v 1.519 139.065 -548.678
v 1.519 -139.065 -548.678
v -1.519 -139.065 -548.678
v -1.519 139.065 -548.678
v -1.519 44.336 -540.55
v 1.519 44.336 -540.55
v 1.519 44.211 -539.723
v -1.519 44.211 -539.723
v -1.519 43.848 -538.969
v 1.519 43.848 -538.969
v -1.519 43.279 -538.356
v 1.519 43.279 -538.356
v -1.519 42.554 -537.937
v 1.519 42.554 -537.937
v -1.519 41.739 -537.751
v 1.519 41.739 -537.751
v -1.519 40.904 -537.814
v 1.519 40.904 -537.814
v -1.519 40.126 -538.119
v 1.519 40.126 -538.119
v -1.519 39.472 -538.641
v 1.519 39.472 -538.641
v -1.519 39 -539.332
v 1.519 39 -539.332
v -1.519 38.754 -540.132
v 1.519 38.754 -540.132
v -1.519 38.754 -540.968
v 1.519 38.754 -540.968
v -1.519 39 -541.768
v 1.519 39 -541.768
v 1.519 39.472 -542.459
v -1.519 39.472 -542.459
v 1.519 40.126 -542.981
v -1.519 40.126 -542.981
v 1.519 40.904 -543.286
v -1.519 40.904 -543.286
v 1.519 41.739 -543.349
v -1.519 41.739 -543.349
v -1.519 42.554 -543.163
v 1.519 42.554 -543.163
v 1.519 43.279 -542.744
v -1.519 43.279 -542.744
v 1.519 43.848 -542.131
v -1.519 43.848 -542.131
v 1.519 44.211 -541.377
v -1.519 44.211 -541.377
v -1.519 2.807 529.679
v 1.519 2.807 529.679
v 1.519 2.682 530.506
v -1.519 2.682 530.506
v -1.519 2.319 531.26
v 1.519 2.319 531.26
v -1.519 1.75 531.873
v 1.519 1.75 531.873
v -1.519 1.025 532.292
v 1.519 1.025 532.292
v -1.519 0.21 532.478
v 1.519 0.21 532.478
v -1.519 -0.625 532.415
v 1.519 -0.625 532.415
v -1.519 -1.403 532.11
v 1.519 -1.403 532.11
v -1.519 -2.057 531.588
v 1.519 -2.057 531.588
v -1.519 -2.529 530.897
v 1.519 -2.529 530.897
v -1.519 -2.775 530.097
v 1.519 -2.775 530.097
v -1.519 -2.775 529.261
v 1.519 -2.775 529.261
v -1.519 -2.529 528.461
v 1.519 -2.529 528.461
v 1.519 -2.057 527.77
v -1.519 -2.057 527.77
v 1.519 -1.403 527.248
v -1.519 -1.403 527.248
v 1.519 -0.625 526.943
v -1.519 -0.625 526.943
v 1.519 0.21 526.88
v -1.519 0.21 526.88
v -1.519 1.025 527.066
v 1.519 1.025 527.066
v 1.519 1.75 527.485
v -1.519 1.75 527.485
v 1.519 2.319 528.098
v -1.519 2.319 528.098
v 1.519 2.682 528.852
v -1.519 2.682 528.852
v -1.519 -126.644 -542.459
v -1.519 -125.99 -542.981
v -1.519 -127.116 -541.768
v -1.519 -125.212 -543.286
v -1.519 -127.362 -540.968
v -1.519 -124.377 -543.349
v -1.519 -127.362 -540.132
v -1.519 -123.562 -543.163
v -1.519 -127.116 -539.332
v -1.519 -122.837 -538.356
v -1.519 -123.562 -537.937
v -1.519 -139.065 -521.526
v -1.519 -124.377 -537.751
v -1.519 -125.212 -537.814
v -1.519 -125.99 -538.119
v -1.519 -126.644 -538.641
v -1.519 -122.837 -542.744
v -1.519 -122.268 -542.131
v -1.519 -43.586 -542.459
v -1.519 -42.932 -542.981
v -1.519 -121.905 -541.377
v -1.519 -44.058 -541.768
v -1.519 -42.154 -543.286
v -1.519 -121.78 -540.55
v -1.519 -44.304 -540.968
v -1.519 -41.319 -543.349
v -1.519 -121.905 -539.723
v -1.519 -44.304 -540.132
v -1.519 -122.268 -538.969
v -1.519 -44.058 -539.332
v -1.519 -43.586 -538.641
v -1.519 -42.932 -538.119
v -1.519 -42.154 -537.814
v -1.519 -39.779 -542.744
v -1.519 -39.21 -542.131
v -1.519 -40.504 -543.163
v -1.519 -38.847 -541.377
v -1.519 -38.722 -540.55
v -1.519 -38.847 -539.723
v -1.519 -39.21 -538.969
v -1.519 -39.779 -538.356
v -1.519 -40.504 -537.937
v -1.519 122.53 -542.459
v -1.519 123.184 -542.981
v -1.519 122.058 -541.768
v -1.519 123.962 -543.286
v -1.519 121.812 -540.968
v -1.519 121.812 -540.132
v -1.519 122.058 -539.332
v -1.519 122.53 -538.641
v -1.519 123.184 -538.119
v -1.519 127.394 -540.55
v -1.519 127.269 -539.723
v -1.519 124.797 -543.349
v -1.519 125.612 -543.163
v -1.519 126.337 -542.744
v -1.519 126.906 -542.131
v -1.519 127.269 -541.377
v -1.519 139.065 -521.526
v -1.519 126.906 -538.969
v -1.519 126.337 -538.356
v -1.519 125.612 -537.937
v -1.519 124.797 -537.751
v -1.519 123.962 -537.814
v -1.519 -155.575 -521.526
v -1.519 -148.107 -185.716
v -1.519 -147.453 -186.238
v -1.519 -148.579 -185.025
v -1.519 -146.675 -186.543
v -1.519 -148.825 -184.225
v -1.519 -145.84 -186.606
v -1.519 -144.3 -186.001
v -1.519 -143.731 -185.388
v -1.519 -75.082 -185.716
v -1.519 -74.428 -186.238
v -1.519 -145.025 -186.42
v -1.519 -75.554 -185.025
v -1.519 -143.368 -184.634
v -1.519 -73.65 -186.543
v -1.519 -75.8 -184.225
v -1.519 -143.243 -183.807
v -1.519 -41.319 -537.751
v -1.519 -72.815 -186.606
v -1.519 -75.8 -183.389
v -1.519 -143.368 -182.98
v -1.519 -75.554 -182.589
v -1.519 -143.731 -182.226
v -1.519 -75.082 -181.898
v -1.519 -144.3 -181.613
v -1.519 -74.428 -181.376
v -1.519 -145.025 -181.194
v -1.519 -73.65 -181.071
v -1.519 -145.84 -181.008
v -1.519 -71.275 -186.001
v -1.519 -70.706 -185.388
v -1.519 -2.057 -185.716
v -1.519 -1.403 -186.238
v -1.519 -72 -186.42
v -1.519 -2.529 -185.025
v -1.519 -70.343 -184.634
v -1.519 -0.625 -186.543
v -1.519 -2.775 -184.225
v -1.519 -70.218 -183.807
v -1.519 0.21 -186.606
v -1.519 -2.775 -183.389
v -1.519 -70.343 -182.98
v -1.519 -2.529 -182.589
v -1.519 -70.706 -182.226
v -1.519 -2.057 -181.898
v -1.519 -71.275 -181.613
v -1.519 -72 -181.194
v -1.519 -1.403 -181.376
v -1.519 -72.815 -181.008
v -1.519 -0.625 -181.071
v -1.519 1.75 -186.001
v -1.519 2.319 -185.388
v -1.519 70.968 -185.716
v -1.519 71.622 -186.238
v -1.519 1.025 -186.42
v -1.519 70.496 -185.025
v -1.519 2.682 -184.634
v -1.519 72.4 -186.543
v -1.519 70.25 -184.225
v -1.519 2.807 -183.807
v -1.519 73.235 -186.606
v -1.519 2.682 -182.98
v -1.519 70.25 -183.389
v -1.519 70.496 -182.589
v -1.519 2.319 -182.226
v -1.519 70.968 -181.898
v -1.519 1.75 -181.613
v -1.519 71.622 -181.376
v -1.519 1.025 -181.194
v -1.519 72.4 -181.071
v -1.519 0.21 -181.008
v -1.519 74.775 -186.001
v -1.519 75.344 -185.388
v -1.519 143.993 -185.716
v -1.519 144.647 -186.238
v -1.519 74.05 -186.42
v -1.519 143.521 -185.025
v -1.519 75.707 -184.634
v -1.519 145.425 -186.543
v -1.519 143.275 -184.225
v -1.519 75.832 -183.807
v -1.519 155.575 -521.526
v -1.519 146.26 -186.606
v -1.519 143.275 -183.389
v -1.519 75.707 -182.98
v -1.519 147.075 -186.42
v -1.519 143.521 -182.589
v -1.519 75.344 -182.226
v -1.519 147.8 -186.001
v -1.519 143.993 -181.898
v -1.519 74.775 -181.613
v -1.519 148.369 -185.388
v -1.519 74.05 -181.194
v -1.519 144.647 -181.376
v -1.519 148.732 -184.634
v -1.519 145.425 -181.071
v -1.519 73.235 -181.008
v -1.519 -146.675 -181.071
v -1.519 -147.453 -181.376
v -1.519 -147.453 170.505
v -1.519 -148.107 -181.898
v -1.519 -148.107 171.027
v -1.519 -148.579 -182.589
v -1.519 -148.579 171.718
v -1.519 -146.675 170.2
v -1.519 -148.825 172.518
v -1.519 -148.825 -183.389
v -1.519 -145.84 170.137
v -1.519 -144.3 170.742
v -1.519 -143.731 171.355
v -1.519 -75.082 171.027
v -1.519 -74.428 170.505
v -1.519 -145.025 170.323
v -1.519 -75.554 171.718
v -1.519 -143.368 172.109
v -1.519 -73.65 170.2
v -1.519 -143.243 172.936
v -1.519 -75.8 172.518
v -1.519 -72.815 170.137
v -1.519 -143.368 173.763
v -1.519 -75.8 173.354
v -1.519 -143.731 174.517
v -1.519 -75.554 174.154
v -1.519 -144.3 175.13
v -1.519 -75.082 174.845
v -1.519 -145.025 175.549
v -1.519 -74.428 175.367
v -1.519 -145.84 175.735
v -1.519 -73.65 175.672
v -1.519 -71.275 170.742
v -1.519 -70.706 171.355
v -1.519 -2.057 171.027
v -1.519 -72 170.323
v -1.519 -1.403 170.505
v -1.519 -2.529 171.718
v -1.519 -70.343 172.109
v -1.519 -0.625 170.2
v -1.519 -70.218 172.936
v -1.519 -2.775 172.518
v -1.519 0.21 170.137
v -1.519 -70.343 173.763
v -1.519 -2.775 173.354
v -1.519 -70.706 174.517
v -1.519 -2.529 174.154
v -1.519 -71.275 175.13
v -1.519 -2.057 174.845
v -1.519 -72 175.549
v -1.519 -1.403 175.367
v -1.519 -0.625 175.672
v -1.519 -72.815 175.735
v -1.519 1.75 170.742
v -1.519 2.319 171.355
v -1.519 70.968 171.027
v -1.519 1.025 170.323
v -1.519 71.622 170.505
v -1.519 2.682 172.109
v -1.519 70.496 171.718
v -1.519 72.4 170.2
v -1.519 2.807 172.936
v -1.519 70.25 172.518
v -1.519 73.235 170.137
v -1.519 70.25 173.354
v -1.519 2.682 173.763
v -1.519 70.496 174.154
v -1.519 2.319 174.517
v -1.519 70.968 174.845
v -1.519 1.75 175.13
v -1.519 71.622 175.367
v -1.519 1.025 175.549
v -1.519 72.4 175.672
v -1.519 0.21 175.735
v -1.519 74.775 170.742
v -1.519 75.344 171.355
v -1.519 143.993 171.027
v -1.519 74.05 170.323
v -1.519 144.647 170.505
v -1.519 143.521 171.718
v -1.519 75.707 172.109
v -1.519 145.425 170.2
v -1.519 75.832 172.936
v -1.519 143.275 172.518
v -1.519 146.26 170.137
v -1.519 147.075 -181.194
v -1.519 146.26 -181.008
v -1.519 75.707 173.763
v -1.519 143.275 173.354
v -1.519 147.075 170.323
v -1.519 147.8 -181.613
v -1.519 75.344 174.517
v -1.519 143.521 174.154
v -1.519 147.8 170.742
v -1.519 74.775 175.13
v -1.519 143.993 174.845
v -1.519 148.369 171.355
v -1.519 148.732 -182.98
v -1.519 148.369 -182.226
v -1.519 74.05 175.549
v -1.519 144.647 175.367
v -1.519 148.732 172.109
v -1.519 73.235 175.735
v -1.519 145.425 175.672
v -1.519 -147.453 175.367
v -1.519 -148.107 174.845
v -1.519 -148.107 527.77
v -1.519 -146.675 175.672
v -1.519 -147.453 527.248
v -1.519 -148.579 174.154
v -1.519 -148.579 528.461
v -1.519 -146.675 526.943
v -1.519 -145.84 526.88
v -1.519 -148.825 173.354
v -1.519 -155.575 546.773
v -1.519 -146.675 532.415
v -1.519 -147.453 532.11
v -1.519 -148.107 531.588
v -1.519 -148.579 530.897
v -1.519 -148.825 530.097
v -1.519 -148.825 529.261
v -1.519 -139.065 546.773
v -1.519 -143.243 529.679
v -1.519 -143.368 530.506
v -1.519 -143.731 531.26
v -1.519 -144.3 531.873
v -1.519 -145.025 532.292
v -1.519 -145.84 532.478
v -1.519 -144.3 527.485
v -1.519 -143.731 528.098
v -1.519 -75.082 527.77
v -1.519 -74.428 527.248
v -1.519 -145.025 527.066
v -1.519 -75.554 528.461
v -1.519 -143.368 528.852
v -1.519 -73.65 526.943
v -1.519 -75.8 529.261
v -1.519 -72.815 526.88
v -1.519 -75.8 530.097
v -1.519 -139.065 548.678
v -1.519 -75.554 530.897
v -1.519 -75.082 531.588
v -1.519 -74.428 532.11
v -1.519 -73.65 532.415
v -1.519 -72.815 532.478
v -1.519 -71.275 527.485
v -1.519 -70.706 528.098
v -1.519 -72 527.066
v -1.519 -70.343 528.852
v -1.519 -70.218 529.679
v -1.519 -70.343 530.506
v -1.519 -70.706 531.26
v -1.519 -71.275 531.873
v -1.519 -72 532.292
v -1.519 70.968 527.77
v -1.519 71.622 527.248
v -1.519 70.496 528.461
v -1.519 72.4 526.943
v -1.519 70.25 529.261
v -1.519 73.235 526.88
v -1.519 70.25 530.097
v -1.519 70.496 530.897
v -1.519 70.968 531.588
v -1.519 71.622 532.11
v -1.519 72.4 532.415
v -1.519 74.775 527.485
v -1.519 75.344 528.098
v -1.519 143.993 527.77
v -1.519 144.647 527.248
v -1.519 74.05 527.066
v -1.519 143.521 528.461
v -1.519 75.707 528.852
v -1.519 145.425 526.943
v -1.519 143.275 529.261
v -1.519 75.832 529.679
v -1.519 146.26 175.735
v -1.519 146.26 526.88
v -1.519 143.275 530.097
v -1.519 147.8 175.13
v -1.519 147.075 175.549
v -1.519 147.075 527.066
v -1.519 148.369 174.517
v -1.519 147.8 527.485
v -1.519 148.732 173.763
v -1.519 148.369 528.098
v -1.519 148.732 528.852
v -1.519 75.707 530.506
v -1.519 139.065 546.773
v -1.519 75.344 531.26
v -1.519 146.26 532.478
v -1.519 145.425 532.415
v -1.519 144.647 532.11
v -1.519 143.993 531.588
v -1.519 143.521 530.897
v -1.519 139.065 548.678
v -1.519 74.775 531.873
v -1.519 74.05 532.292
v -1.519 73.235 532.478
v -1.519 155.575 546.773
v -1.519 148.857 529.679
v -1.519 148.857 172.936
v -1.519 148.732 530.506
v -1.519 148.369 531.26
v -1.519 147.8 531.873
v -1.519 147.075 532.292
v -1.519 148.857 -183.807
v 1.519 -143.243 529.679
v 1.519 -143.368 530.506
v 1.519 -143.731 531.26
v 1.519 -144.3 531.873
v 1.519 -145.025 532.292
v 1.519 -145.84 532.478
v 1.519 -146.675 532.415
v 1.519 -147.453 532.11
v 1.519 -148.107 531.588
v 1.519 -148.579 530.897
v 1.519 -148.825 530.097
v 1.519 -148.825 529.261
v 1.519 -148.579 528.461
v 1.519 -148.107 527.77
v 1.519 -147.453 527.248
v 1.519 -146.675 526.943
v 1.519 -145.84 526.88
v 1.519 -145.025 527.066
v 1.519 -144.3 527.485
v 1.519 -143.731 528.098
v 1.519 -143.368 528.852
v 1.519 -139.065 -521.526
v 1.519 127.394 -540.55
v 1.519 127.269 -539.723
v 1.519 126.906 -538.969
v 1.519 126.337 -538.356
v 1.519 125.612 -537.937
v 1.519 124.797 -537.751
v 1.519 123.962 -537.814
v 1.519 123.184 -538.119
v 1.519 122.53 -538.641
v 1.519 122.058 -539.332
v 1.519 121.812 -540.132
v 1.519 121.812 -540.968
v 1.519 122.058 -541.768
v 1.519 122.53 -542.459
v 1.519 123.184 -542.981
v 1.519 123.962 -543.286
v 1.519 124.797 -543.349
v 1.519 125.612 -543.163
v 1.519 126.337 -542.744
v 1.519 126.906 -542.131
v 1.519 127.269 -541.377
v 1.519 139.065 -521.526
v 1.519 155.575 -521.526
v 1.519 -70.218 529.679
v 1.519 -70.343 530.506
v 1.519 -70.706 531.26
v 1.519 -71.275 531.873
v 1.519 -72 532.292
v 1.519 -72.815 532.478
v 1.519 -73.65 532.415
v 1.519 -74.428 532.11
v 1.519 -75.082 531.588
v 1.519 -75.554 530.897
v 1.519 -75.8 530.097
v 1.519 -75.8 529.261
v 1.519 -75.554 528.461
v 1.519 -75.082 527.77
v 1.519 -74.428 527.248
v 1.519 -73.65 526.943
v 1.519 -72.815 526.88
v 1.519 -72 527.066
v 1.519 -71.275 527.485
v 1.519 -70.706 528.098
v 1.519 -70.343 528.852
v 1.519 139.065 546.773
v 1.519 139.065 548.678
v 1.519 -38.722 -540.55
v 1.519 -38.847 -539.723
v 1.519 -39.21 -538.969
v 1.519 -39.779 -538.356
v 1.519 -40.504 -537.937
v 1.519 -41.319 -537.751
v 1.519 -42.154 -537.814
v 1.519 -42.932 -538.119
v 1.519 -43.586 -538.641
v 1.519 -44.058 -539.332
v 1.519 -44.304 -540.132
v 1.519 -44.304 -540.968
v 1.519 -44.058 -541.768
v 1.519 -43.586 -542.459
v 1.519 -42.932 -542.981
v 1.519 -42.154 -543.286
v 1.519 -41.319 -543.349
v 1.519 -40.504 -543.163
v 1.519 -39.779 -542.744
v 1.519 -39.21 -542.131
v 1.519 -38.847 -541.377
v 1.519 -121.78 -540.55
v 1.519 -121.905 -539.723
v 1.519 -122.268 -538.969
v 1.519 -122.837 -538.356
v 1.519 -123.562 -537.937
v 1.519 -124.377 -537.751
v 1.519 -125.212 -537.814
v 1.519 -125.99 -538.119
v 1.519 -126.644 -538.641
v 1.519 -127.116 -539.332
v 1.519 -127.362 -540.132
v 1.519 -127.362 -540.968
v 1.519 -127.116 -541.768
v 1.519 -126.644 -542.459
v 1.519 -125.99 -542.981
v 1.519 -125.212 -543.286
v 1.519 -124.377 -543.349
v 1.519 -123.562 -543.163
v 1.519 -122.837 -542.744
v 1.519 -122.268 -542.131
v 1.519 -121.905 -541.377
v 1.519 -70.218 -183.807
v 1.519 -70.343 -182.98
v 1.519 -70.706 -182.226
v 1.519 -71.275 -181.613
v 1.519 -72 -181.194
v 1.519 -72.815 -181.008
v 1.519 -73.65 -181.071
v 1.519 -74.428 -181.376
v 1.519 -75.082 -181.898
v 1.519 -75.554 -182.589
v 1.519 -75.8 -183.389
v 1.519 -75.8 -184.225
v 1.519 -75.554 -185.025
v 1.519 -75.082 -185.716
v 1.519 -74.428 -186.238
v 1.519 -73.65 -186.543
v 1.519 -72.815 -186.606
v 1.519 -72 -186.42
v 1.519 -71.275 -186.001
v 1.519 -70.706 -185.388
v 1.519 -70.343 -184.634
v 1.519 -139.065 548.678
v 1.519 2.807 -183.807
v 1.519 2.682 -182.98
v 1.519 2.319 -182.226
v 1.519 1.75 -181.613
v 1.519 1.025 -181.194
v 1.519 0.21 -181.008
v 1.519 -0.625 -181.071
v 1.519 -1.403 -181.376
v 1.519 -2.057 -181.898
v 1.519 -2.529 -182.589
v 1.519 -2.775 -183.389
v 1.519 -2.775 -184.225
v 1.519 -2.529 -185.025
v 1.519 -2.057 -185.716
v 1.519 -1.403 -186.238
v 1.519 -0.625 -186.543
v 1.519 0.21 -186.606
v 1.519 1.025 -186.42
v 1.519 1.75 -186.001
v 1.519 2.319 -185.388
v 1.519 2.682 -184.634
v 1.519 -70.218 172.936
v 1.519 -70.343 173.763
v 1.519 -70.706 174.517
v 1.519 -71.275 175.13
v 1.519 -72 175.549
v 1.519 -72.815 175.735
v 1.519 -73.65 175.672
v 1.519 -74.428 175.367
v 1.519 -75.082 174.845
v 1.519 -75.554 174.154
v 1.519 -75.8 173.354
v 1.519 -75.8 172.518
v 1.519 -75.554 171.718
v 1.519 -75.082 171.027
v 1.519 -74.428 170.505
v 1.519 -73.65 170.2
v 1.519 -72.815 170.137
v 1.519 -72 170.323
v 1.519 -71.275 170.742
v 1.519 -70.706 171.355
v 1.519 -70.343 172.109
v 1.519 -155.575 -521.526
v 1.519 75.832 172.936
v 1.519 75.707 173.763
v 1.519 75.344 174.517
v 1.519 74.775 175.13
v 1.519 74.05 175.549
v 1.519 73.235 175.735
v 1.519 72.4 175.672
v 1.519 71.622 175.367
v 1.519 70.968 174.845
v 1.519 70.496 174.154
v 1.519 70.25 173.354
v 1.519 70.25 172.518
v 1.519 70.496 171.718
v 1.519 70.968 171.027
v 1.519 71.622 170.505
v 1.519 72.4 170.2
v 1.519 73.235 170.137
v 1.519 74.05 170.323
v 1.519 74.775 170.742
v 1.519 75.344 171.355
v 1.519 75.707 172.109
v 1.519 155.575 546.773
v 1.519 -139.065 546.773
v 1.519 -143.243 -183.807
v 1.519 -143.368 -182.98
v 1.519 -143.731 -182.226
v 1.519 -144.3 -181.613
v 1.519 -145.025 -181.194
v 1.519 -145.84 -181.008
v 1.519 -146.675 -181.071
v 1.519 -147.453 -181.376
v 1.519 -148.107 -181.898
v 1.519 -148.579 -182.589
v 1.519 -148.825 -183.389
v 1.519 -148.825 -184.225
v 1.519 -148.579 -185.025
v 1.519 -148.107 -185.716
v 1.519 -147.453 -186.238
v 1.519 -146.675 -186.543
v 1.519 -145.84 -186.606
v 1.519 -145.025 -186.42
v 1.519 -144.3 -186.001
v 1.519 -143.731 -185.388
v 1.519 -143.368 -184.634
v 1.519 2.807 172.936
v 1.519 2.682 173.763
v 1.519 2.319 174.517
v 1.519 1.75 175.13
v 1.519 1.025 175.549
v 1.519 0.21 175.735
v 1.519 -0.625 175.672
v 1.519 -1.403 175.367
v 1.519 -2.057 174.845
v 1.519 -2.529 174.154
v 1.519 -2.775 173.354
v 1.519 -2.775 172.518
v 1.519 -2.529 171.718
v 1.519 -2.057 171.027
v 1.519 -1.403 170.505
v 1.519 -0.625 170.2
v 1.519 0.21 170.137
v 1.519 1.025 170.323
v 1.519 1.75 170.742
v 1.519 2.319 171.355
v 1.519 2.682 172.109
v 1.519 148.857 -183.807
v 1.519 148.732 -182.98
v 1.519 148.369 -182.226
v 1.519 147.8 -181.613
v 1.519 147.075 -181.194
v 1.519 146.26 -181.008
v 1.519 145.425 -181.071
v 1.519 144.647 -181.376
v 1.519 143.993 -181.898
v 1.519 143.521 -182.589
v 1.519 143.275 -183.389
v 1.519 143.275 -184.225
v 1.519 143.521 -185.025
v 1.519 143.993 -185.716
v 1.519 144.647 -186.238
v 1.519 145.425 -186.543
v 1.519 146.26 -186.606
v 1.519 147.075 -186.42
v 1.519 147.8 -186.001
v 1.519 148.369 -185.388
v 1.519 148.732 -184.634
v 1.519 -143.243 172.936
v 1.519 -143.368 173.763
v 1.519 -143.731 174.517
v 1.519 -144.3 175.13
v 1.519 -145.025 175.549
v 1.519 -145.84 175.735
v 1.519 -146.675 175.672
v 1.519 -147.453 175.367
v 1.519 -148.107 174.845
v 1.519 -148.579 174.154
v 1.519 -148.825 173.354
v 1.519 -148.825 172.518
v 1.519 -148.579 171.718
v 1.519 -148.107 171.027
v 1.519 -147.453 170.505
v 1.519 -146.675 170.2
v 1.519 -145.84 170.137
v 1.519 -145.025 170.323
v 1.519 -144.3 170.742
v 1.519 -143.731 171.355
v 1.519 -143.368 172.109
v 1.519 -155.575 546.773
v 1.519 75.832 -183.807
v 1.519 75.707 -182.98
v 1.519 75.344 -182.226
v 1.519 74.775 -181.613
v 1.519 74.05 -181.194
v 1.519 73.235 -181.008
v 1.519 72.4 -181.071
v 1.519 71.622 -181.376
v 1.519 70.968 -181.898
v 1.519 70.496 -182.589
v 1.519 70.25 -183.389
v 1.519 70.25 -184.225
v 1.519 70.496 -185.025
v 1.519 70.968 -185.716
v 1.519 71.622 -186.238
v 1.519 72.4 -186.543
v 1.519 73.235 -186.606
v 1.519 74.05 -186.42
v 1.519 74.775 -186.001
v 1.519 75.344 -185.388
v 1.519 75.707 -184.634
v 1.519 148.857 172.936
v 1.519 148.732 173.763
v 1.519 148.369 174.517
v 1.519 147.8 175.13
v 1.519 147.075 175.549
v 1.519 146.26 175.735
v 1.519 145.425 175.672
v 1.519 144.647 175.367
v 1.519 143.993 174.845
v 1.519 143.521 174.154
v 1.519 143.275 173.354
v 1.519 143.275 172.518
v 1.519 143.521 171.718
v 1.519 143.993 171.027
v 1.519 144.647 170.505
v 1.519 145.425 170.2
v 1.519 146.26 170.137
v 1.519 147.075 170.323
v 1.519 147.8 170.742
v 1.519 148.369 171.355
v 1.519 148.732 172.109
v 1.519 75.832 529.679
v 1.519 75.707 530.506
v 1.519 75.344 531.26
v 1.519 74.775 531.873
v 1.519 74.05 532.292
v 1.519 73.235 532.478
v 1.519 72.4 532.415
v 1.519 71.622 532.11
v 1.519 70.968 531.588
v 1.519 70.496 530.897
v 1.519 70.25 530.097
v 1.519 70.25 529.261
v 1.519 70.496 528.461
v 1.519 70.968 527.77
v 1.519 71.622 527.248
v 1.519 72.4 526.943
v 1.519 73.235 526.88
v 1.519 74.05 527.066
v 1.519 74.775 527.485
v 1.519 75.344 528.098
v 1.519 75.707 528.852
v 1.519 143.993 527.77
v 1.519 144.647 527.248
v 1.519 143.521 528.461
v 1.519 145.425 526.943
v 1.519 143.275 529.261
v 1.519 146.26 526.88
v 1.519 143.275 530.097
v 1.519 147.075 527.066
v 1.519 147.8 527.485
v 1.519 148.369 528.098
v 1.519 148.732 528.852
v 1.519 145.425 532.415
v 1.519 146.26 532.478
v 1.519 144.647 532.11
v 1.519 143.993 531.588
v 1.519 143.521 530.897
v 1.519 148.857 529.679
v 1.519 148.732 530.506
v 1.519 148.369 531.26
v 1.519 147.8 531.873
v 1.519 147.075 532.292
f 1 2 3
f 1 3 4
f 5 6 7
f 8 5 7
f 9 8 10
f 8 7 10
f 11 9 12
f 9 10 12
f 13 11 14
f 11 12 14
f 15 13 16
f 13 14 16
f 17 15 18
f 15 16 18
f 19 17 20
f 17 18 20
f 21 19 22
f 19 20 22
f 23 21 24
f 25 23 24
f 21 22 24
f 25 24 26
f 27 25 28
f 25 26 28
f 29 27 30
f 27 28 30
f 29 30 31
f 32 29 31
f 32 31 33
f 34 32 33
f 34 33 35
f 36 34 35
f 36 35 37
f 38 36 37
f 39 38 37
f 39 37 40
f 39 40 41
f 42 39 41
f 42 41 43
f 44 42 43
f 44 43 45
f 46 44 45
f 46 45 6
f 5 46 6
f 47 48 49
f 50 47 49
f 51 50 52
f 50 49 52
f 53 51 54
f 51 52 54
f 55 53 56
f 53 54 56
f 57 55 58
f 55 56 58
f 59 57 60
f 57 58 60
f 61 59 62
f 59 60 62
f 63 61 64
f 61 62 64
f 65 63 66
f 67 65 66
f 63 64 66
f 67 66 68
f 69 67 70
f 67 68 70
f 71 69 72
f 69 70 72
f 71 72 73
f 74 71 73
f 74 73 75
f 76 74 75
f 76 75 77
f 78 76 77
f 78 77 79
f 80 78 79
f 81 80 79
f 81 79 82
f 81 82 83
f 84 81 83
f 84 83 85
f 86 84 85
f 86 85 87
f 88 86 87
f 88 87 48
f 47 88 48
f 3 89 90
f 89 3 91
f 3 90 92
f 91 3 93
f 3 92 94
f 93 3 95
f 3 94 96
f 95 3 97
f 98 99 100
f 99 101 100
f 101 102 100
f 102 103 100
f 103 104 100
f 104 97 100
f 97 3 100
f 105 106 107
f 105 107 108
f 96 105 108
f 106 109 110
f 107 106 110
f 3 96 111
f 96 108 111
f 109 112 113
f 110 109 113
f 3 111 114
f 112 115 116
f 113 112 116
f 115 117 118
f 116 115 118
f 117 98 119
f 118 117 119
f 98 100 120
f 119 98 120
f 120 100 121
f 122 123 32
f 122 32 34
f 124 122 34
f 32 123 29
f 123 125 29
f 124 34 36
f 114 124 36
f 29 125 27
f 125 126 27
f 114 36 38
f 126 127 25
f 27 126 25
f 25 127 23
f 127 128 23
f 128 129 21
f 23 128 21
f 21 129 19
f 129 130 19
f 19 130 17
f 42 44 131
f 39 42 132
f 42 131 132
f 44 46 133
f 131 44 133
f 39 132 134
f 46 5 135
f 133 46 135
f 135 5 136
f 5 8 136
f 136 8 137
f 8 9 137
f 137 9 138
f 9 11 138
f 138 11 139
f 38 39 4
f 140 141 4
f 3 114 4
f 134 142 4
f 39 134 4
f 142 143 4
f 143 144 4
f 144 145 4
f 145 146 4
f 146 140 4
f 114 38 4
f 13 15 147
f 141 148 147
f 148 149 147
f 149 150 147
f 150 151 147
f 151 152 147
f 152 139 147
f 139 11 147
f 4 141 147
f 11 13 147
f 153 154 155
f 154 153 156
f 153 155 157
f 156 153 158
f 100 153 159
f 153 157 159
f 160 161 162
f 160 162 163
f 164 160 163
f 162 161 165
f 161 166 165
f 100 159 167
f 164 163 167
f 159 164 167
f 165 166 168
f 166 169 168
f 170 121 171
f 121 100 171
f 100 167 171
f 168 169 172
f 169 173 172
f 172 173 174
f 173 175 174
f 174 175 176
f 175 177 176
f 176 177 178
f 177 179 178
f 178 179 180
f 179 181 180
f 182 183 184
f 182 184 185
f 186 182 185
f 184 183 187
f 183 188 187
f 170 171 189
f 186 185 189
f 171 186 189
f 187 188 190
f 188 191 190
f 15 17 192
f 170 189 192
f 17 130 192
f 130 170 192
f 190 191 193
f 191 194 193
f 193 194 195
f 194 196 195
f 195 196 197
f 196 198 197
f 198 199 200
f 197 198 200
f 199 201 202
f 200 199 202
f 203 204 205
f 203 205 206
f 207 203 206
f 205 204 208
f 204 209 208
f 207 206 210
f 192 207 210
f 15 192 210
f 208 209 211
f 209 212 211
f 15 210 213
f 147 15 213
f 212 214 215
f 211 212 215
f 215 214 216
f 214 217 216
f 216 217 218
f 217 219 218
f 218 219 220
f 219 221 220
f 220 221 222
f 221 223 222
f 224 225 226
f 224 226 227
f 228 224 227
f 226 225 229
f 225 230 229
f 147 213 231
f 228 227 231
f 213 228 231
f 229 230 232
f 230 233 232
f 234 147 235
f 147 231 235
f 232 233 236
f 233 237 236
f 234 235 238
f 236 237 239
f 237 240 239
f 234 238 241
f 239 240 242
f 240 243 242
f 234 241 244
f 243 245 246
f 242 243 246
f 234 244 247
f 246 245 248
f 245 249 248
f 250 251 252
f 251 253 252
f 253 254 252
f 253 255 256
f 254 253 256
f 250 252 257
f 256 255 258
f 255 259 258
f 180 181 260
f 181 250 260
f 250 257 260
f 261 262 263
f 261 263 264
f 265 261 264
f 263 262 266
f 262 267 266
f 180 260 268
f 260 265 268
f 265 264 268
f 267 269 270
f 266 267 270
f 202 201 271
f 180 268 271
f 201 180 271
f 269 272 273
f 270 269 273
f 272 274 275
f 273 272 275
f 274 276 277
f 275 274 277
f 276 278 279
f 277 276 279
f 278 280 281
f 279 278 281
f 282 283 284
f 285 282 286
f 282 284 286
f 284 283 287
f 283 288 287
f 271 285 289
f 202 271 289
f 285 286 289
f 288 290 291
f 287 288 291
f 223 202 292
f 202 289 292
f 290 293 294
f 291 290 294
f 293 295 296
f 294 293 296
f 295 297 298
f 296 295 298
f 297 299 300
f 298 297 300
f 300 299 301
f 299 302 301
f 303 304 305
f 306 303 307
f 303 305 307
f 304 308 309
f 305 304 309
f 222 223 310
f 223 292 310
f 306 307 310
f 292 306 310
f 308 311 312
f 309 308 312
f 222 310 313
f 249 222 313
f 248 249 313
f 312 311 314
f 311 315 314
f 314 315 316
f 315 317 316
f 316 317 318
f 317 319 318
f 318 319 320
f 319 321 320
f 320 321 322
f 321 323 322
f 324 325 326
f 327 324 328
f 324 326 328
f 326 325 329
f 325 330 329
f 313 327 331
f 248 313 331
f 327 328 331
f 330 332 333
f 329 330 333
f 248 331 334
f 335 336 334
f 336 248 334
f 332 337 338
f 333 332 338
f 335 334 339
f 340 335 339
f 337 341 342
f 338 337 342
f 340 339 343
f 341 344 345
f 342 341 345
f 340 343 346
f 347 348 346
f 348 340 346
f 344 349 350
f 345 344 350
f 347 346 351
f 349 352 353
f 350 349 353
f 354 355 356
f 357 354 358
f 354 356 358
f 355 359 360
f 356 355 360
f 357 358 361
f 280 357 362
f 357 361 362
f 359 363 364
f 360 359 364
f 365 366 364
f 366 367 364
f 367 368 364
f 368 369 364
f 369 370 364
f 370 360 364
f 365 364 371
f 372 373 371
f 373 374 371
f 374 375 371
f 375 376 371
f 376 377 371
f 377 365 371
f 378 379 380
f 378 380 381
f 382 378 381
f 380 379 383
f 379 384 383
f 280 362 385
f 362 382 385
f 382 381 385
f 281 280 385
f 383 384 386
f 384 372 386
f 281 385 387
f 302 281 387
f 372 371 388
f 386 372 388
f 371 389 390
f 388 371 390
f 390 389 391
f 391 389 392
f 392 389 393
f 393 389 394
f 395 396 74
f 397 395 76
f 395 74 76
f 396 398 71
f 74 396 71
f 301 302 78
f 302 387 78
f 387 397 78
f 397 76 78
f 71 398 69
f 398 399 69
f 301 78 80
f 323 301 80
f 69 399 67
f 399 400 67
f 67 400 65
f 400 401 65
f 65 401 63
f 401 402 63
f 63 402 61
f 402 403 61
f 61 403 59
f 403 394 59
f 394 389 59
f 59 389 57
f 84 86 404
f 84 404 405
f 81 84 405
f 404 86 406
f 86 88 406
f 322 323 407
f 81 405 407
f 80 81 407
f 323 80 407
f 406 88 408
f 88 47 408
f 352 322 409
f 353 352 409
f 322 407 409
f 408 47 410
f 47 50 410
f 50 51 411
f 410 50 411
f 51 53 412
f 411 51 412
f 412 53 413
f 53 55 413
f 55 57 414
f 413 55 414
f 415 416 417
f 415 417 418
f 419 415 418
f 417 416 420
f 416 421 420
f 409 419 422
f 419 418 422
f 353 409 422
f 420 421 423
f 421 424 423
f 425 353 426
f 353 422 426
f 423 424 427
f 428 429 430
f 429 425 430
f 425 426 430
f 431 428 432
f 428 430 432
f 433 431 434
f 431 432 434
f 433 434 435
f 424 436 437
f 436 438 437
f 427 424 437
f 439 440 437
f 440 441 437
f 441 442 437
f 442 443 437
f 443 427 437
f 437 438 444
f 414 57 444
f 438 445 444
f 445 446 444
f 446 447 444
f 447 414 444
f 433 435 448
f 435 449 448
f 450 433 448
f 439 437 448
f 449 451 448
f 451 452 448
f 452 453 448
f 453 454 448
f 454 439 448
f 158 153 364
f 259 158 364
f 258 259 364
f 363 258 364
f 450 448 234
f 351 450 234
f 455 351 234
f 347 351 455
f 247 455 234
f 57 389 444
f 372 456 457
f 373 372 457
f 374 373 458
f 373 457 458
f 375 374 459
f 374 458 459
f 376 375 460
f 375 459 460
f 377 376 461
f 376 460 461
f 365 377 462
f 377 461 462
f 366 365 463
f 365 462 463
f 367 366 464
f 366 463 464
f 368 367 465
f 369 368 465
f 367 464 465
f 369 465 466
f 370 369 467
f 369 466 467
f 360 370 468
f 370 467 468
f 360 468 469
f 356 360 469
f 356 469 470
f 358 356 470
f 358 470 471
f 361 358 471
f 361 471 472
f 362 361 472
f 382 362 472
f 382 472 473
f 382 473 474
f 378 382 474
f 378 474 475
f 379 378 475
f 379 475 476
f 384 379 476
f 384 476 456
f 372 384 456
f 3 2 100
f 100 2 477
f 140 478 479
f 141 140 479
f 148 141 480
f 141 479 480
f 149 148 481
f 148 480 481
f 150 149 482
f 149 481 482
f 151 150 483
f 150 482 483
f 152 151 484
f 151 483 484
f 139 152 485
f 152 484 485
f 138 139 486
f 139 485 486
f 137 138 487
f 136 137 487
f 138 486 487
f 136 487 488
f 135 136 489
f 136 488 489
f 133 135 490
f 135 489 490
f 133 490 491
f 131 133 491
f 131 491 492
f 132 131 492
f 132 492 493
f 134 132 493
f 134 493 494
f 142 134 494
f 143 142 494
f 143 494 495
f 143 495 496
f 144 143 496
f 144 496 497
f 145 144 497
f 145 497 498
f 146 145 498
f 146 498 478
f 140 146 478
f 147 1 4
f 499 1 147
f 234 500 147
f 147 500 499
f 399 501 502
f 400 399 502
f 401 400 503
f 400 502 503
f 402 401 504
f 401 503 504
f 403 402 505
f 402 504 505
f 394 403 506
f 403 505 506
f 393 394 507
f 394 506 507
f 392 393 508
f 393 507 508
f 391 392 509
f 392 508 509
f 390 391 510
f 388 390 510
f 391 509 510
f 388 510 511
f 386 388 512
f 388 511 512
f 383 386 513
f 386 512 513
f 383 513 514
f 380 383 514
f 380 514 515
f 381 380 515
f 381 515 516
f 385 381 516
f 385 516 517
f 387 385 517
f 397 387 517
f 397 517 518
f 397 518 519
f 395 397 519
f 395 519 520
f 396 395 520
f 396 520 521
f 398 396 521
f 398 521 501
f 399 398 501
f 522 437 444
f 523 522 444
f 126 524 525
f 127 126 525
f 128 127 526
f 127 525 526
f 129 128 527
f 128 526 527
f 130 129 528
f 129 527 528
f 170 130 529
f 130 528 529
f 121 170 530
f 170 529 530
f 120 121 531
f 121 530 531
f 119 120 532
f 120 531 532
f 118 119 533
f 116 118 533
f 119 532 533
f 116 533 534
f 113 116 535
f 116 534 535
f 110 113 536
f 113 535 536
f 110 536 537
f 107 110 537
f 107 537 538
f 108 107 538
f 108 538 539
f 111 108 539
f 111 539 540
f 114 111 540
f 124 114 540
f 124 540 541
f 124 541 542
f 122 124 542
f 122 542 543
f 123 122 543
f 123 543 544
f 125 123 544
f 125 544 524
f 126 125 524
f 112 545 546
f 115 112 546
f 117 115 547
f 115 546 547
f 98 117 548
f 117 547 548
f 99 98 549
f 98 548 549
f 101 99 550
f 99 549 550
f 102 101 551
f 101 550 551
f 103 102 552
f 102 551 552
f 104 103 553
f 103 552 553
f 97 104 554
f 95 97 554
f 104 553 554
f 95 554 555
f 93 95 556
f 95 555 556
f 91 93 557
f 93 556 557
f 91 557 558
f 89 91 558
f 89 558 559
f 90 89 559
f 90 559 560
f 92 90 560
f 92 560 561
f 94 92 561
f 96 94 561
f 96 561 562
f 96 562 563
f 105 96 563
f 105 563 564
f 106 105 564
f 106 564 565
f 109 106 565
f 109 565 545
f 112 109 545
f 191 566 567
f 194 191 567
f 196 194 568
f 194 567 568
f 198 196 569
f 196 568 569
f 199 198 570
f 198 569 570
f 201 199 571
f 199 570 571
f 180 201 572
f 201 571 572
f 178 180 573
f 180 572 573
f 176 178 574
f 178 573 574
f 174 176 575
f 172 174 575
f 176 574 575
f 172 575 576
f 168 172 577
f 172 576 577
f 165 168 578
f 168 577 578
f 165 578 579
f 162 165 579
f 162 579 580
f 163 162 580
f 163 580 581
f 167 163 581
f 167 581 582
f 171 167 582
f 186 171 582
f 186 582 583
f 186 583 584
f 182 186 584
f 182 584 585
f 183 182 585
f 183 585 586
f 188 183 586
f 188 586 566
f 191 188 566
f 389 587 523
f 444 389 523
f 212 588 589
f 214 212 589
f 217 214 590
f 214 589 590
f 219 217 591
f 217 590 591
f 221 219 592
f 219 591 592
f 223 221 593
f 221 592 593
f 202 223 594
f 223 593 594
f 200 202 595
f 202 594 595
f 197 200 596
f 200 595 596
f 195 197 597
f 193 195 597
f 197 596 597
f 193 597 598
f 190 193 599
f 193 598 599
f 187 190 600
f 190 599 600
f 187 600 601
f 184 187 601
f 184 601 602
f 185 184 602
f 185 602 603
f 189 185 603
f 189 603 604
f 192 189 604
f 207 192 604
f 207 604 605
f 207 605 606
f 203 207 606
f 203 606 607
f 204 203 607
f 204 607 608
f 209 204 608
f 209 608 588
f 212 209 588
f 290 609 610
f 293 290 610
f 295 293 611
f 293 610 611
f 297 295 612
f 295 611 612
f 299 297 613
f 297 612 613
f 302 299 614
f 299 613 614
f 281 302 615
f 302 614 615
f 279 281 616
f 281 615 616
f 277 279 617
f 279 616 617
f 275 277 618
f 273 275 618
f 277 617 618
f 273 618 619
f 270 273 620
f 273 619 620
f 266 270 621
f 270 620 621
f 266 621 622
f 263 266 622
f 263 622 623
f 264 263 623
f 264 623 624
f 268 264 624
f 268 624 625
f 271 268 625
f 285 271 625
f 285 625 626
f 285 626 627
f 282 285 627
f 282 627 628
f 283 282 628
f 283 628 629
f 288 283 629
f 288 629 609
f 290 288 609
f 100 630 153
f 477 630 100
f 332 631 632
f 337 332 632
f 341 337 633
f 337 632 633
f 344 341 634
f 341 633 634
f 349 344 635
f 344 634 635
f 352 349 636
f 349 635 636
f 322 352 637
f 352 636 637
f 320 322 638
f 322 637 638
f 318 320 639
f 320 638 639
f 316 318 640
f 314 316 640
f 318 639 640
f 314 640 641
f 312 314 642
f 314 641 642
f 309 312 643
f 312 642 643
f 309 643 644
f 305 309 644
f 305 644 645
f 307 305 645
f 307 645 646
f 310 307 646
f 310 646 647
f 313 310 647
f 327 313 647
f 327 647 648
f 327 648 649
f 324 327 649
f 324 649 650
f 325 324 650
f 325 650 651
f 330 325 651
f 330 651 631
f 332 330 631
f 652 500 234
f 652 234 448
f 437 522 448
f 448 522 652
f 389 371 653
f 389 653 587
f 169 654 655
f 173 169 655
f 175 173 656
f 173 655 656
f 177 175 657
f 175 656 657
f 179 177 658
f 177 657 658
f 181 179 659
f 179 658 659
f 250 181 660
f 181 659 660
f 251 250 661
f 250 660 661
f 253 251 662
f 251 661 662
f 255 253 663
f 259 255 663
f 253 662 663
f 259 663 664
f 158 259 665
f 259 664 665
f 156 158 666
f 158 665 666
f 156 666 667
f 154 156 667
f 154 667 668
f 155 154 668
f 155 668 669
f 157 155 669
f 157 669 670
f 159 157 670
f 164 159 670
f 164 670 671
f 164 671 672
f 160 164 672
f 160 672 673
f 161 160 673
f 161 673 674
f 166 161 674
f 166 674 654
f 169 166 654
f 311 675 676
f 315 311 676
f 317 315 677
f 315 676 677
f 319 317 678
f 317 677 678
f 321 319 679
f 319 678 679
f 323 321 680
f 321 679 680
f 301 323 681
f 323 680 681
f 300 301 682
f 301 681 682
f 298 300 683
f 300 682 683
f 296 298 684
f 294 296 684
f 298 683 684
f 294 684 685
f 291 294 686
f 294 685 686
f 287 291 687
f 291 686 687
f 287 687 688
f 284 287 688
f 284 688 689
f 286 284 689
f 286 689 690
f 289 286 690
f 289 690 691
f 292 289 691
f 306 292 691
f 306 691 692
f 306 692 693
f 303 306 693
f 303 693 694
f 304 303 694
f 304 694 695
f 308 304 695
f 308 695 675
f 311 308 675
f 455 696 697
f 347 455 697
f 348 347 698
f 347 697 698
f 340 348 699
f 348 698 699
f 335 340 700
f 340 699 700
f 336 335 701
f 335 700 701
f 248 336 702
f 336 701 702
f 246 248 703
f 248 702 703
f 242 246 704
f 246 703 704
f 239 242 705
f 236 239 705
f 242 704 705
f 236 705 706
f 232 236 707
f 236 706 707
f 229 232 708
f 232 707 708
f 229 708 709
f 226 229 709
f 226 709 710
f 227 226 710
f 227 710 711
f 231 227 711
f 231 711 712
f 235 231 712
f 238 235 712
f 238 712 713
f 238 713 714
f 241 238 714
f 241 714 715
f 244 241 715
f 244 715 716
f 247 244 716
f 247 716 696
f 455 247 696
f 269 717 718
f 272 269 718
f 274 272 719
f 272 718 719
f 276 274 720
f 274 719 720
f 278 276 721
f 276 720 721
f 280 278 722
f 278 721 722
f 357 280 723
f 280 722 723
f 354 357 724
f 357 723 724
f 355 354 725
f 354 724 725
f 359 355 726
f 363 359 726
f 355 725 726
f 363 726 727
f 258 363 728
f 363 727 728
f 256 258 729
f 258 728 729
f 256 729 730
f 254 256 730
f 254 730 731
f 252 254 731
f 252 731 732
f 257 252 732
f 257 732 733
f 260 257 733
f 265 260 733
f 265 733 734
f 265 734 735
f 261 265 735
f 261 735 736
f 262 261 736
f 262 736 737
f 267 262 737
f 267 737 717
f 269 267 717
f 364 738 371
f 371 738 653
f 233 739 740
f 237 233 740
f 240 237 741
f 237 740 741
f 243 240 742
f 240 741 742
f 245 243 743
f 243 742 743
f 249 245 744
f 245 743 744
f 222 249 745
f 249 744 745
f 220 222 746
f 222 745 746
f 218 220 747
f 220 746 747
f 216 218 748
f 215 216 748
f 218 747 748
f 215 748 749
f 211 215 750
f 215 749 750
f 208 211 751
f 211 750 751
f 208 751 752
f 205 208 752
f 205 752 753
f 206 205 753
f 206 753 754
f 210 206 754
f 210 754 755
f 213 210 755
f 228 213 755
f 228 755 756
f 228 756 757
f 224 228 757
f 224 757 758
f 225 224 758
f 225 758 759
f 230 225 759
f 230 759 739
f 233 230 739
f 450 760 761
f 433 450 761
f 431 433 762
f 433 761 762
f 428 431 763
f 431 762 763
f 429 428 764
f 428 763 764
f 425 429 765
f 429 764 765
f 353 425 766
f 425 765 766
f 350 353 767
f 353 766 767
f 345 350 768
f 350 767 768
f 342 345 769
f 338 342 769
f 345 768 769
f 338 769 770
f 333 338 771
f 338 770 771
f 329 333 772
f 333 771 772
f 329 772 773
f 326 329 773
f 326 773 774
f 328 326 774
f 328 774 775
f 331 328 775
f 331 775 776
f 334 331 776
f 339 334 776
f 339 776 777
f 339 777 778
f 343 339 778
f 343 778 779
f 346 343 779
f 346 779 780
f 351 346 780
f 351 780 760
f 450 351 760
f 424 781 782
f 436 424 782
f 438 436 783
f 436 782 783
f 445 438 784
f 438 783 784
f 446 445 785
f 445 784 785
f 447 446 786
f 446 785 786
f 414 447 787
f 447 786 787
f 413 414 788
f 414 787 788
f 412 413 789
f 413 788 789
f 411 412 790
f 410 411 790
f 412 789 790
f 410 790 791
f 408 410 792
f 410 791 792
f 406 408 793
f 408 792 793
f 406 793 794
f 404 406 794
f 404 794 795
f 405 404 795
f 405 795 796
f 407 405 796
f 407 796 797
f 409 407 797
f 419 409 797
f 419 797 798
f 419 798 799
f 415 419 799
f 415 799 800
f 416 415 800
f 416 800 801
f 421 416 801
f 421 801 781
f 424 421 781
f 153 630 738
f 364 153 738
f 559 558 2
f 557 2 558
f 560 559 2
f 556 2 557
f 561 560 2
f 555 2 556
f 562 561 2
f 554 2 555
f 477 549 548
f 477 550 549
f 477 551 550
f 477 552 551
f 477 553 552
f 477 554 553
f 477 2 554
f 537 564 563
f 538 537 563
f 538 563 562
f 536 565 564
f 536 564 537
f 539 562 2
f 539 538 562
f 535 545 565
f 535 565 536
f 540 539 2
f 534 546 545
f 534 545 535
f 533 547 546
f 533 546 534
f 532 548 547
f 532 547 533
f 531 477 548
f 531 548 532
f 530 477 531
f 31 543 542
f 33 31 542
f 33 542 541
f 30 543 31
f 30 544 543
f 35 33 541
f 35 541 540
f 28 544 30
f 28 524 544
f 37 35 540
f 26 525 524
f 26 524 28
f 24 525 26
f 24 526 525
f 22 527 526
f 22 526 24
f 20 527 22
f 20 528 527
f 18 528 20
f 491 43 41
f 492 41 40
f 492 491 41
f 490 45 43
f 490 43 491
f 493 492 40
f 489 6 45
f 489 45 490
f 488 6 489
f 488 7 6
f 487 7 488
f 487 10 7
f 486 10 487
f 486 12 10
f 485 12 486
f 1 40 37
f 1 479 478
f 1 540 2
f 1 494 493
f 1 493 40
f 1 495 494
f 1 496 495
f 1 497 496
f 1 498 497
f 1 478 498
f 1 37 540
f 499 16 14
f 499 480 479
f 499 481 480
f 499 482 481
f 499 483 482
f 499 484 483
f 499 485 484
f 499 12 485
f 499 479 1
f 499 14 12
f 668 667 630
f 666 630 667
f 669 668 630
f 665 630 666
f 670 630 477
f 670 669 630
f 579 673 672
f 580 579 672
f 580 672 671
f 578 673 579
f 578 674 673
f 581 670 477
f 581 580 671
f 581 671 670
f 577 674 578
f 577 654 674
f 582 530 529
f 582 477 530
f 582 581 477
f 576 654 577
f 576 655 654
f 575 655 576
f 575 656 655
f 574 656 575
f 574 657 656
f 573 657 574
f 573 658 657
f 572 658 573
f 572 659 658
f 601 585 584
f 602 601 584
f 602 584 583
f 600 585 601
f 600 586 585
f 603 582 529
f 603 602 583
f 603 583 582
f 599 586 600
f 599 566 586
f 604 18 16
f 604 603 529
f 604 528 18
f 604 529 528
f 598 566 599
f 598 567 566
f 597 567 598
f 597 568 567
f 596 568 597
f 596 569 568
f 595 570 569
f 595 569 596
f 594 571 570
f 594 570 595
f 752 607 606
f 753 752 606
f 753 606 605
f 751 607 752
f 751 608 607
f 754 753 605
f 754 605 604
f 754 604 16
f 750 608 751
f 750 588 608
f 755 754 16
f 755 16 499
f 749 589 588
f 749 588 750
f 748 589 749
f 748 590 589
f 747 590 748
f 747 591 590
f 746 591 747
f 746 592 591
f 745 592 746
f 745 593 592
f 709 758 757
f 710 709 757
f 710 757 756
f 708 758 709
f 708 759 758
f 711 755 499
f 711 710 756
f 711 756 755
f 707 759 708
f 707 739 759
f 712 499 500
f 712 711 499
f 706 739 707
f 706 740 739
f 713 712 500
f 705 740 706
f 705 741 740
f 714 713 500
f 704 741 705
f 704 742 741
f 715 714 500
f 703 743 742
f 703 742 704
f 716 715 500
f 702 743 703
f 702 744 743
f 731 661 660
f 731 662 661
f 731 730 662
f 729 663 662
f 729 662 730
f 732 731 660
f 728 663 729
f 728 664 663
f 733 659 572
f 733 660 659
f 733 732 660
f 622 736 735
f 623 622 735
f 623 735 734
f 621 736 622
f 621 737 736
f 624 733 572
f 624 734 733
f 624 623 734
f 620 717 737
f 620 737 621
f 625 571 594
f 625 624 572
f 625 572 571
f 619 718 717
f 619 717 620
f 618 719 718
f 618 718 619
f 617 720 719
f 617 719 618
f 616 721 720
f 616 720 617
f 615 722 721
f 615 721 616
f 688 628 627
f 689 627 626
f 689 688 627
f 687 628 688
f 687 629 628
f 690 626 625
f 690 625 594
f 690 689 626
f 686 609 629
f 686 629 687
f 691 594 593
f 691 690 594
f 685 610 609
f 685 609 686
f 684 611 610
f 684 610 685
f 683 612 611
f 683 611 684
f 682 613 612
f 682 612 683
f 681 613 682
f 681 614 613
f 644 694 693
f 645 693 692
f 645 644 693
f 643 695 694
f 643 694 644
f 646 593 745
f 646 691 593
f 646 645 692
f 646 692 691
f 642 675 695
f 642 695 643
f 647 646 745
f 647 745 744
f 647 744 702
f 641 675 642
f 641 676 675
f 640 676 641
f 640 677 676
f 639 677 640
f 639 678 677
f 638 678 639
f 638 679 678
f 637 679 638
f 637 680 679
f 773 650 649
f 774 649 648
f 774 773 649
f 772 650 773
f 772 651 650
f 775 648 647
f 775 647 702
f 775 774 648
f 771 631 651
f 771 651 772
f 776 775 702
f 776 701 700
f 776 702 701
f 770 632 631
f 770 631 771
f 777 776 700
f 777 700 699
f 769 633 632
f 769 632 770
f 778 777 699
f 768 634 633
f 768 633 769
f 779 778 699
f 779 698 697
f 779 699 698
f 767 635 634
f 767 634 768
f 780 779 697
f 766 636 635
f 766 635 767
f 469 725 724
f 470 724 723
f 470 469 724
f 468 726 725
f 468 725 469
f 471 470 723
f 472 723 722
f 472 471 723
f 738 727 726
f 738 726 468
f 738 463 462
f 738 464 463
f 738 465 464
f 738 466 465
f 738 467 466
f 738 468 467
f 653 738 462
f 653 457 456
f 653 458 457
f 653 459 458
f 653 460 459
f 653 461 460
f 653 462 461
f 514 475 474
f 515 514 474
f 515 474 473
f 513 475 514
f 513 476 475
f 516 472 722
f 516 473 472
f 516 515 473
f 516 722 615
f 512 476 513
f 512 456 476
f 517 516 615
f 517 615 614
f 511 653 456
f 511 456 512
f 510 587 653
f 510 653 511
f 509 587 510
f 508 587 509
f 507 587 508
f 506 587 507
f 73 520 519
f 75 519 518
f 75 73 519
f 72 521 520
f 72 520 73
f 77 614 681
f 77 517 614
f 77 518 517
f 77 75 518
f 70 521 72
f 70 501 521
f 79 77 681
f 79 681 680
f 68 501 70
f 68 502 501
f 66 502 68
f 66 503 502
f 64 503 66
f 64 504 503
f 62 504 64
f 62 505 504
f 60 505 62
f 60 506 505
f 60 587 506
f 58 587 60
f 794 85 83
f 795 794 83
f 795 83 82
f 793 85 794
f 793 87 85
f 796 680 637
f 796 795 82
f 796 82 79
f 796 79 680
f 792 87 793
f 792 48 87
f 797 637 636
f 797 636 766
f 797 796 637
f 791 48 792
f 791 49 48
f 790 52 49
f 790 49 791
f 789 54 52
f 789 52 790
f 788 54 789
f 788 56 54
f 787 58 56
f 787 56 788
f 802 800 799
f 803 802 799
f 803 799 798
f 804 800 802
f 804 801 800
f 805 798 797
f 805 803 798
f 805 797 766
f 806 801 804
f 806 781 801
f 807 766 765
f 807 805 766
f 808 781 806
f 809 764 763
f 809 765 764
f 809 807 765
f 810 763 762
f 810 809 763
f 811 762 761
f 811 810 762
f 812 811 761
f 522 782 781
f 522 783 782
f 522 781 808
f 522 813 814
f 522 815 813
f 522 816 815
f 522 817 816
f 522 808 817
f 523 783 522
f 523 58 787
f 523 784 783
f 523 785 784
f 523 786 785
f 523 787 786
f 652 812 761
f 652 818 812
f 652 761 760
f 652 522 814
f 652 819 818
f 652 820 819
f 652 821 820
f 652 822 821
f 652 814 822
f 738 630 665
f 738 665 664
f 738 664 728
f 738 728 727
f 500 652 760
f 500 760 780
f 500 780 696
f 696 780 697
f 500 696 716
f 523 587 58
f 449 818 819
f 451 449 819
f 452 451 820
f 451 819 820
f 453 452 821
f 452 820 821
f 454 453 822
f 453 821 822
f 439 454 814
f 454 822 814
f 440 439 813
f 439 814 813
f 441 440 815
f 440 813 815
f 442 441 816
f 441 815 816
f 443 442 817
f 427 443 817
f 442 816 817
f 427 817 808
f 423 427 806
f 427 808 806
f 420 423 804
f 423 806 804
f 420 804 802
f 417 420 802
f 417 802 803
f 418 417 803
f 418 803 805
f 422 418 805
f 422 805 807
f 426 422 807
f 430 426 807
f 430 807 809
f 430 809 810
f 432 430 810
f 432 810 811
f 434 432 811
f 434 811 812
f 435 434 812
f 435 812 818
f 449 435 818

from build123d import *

# Parameters (mm, degrees)
F0_W     = 311.15
F0_H     = 1097.3562
F1_DEPTH = 1.51892
F2_W     = 16.51
F2_H     = 27.1526
F3_DEPTH = 3.03784
F4_W     = 16.51
F4_H     = 1.905
F5_DEPTH = 3.03784
F7_D     = 5.6134


# Not quite as in the source:
# - a pattern or mirror of a feature is missing from the dataset's text; its kind, count and spacing are read off the source's solid
# - a feature names something its author has since deleted; it is built from what else it names


with BuildPart() as f1:
    # F0 (on Right) → F1 (new body, symmetric)
    with BuildSketch(Plane.YZ):
        Rectangle(F0_W, F0_H)
    extrude(amount=F1_DEPTH, both=True)

    # F2 (on face) → F3 (cut, through all)
    with BuildSketch(Plane.YZ.offset(1.51892)):
        with Locations((-147.32, -535.1018)):
            Rectangle(F2_W, F2_H)
    f3 = extrude(amount=-F3_DEPTH, mode=Mode.SUBTRACT)

    # F3_copies: F3 across plane
    add(f3.mirror(Plane.ZX), mode=Mode.SUBTRACT)

    # F4 (on face) → F5 (cut, through all)
    with BuildSketch(Plane.YZ.offset(1.51892)):
        with Locations((-147.32, 547.7256)):
            Rectangle(F4_W, F4_H)
        with Locations((147.32, 547.7256)):
            Rectangle(F4_W, F4_H)
    extrude(amount=-F5_DEPTH, mode=Mode.SUBTRACT)

    # F7 (through all)
    with Locations(Plane(origin=(-1.51892, 0, 0), x_dir=(0, -1, 0), z_dir=(-1, 0, 0))):
        with Locations((124.587, -540.5501), (41.529, -540.5501), (-41.529, -540.5501), (-124.587, -540.5501), (146.05, -183.8071), (146.05, 172.9359), (73.025, 172.9359), (0, 172.9359), (-73.025, 172.9359), (-146.05, 172.9359), (-146.05, -183.8071), (-73.025, -183.8071), (0, -183.8071), (73.025, -183.8071), (146.05, 529.6789), (73.025, 529.6789), (0, 529.6789), (-73.025, 529.6789), (-146.05, 529.6789)):
            Hole(F7_D / 2)


solid = f1.part
